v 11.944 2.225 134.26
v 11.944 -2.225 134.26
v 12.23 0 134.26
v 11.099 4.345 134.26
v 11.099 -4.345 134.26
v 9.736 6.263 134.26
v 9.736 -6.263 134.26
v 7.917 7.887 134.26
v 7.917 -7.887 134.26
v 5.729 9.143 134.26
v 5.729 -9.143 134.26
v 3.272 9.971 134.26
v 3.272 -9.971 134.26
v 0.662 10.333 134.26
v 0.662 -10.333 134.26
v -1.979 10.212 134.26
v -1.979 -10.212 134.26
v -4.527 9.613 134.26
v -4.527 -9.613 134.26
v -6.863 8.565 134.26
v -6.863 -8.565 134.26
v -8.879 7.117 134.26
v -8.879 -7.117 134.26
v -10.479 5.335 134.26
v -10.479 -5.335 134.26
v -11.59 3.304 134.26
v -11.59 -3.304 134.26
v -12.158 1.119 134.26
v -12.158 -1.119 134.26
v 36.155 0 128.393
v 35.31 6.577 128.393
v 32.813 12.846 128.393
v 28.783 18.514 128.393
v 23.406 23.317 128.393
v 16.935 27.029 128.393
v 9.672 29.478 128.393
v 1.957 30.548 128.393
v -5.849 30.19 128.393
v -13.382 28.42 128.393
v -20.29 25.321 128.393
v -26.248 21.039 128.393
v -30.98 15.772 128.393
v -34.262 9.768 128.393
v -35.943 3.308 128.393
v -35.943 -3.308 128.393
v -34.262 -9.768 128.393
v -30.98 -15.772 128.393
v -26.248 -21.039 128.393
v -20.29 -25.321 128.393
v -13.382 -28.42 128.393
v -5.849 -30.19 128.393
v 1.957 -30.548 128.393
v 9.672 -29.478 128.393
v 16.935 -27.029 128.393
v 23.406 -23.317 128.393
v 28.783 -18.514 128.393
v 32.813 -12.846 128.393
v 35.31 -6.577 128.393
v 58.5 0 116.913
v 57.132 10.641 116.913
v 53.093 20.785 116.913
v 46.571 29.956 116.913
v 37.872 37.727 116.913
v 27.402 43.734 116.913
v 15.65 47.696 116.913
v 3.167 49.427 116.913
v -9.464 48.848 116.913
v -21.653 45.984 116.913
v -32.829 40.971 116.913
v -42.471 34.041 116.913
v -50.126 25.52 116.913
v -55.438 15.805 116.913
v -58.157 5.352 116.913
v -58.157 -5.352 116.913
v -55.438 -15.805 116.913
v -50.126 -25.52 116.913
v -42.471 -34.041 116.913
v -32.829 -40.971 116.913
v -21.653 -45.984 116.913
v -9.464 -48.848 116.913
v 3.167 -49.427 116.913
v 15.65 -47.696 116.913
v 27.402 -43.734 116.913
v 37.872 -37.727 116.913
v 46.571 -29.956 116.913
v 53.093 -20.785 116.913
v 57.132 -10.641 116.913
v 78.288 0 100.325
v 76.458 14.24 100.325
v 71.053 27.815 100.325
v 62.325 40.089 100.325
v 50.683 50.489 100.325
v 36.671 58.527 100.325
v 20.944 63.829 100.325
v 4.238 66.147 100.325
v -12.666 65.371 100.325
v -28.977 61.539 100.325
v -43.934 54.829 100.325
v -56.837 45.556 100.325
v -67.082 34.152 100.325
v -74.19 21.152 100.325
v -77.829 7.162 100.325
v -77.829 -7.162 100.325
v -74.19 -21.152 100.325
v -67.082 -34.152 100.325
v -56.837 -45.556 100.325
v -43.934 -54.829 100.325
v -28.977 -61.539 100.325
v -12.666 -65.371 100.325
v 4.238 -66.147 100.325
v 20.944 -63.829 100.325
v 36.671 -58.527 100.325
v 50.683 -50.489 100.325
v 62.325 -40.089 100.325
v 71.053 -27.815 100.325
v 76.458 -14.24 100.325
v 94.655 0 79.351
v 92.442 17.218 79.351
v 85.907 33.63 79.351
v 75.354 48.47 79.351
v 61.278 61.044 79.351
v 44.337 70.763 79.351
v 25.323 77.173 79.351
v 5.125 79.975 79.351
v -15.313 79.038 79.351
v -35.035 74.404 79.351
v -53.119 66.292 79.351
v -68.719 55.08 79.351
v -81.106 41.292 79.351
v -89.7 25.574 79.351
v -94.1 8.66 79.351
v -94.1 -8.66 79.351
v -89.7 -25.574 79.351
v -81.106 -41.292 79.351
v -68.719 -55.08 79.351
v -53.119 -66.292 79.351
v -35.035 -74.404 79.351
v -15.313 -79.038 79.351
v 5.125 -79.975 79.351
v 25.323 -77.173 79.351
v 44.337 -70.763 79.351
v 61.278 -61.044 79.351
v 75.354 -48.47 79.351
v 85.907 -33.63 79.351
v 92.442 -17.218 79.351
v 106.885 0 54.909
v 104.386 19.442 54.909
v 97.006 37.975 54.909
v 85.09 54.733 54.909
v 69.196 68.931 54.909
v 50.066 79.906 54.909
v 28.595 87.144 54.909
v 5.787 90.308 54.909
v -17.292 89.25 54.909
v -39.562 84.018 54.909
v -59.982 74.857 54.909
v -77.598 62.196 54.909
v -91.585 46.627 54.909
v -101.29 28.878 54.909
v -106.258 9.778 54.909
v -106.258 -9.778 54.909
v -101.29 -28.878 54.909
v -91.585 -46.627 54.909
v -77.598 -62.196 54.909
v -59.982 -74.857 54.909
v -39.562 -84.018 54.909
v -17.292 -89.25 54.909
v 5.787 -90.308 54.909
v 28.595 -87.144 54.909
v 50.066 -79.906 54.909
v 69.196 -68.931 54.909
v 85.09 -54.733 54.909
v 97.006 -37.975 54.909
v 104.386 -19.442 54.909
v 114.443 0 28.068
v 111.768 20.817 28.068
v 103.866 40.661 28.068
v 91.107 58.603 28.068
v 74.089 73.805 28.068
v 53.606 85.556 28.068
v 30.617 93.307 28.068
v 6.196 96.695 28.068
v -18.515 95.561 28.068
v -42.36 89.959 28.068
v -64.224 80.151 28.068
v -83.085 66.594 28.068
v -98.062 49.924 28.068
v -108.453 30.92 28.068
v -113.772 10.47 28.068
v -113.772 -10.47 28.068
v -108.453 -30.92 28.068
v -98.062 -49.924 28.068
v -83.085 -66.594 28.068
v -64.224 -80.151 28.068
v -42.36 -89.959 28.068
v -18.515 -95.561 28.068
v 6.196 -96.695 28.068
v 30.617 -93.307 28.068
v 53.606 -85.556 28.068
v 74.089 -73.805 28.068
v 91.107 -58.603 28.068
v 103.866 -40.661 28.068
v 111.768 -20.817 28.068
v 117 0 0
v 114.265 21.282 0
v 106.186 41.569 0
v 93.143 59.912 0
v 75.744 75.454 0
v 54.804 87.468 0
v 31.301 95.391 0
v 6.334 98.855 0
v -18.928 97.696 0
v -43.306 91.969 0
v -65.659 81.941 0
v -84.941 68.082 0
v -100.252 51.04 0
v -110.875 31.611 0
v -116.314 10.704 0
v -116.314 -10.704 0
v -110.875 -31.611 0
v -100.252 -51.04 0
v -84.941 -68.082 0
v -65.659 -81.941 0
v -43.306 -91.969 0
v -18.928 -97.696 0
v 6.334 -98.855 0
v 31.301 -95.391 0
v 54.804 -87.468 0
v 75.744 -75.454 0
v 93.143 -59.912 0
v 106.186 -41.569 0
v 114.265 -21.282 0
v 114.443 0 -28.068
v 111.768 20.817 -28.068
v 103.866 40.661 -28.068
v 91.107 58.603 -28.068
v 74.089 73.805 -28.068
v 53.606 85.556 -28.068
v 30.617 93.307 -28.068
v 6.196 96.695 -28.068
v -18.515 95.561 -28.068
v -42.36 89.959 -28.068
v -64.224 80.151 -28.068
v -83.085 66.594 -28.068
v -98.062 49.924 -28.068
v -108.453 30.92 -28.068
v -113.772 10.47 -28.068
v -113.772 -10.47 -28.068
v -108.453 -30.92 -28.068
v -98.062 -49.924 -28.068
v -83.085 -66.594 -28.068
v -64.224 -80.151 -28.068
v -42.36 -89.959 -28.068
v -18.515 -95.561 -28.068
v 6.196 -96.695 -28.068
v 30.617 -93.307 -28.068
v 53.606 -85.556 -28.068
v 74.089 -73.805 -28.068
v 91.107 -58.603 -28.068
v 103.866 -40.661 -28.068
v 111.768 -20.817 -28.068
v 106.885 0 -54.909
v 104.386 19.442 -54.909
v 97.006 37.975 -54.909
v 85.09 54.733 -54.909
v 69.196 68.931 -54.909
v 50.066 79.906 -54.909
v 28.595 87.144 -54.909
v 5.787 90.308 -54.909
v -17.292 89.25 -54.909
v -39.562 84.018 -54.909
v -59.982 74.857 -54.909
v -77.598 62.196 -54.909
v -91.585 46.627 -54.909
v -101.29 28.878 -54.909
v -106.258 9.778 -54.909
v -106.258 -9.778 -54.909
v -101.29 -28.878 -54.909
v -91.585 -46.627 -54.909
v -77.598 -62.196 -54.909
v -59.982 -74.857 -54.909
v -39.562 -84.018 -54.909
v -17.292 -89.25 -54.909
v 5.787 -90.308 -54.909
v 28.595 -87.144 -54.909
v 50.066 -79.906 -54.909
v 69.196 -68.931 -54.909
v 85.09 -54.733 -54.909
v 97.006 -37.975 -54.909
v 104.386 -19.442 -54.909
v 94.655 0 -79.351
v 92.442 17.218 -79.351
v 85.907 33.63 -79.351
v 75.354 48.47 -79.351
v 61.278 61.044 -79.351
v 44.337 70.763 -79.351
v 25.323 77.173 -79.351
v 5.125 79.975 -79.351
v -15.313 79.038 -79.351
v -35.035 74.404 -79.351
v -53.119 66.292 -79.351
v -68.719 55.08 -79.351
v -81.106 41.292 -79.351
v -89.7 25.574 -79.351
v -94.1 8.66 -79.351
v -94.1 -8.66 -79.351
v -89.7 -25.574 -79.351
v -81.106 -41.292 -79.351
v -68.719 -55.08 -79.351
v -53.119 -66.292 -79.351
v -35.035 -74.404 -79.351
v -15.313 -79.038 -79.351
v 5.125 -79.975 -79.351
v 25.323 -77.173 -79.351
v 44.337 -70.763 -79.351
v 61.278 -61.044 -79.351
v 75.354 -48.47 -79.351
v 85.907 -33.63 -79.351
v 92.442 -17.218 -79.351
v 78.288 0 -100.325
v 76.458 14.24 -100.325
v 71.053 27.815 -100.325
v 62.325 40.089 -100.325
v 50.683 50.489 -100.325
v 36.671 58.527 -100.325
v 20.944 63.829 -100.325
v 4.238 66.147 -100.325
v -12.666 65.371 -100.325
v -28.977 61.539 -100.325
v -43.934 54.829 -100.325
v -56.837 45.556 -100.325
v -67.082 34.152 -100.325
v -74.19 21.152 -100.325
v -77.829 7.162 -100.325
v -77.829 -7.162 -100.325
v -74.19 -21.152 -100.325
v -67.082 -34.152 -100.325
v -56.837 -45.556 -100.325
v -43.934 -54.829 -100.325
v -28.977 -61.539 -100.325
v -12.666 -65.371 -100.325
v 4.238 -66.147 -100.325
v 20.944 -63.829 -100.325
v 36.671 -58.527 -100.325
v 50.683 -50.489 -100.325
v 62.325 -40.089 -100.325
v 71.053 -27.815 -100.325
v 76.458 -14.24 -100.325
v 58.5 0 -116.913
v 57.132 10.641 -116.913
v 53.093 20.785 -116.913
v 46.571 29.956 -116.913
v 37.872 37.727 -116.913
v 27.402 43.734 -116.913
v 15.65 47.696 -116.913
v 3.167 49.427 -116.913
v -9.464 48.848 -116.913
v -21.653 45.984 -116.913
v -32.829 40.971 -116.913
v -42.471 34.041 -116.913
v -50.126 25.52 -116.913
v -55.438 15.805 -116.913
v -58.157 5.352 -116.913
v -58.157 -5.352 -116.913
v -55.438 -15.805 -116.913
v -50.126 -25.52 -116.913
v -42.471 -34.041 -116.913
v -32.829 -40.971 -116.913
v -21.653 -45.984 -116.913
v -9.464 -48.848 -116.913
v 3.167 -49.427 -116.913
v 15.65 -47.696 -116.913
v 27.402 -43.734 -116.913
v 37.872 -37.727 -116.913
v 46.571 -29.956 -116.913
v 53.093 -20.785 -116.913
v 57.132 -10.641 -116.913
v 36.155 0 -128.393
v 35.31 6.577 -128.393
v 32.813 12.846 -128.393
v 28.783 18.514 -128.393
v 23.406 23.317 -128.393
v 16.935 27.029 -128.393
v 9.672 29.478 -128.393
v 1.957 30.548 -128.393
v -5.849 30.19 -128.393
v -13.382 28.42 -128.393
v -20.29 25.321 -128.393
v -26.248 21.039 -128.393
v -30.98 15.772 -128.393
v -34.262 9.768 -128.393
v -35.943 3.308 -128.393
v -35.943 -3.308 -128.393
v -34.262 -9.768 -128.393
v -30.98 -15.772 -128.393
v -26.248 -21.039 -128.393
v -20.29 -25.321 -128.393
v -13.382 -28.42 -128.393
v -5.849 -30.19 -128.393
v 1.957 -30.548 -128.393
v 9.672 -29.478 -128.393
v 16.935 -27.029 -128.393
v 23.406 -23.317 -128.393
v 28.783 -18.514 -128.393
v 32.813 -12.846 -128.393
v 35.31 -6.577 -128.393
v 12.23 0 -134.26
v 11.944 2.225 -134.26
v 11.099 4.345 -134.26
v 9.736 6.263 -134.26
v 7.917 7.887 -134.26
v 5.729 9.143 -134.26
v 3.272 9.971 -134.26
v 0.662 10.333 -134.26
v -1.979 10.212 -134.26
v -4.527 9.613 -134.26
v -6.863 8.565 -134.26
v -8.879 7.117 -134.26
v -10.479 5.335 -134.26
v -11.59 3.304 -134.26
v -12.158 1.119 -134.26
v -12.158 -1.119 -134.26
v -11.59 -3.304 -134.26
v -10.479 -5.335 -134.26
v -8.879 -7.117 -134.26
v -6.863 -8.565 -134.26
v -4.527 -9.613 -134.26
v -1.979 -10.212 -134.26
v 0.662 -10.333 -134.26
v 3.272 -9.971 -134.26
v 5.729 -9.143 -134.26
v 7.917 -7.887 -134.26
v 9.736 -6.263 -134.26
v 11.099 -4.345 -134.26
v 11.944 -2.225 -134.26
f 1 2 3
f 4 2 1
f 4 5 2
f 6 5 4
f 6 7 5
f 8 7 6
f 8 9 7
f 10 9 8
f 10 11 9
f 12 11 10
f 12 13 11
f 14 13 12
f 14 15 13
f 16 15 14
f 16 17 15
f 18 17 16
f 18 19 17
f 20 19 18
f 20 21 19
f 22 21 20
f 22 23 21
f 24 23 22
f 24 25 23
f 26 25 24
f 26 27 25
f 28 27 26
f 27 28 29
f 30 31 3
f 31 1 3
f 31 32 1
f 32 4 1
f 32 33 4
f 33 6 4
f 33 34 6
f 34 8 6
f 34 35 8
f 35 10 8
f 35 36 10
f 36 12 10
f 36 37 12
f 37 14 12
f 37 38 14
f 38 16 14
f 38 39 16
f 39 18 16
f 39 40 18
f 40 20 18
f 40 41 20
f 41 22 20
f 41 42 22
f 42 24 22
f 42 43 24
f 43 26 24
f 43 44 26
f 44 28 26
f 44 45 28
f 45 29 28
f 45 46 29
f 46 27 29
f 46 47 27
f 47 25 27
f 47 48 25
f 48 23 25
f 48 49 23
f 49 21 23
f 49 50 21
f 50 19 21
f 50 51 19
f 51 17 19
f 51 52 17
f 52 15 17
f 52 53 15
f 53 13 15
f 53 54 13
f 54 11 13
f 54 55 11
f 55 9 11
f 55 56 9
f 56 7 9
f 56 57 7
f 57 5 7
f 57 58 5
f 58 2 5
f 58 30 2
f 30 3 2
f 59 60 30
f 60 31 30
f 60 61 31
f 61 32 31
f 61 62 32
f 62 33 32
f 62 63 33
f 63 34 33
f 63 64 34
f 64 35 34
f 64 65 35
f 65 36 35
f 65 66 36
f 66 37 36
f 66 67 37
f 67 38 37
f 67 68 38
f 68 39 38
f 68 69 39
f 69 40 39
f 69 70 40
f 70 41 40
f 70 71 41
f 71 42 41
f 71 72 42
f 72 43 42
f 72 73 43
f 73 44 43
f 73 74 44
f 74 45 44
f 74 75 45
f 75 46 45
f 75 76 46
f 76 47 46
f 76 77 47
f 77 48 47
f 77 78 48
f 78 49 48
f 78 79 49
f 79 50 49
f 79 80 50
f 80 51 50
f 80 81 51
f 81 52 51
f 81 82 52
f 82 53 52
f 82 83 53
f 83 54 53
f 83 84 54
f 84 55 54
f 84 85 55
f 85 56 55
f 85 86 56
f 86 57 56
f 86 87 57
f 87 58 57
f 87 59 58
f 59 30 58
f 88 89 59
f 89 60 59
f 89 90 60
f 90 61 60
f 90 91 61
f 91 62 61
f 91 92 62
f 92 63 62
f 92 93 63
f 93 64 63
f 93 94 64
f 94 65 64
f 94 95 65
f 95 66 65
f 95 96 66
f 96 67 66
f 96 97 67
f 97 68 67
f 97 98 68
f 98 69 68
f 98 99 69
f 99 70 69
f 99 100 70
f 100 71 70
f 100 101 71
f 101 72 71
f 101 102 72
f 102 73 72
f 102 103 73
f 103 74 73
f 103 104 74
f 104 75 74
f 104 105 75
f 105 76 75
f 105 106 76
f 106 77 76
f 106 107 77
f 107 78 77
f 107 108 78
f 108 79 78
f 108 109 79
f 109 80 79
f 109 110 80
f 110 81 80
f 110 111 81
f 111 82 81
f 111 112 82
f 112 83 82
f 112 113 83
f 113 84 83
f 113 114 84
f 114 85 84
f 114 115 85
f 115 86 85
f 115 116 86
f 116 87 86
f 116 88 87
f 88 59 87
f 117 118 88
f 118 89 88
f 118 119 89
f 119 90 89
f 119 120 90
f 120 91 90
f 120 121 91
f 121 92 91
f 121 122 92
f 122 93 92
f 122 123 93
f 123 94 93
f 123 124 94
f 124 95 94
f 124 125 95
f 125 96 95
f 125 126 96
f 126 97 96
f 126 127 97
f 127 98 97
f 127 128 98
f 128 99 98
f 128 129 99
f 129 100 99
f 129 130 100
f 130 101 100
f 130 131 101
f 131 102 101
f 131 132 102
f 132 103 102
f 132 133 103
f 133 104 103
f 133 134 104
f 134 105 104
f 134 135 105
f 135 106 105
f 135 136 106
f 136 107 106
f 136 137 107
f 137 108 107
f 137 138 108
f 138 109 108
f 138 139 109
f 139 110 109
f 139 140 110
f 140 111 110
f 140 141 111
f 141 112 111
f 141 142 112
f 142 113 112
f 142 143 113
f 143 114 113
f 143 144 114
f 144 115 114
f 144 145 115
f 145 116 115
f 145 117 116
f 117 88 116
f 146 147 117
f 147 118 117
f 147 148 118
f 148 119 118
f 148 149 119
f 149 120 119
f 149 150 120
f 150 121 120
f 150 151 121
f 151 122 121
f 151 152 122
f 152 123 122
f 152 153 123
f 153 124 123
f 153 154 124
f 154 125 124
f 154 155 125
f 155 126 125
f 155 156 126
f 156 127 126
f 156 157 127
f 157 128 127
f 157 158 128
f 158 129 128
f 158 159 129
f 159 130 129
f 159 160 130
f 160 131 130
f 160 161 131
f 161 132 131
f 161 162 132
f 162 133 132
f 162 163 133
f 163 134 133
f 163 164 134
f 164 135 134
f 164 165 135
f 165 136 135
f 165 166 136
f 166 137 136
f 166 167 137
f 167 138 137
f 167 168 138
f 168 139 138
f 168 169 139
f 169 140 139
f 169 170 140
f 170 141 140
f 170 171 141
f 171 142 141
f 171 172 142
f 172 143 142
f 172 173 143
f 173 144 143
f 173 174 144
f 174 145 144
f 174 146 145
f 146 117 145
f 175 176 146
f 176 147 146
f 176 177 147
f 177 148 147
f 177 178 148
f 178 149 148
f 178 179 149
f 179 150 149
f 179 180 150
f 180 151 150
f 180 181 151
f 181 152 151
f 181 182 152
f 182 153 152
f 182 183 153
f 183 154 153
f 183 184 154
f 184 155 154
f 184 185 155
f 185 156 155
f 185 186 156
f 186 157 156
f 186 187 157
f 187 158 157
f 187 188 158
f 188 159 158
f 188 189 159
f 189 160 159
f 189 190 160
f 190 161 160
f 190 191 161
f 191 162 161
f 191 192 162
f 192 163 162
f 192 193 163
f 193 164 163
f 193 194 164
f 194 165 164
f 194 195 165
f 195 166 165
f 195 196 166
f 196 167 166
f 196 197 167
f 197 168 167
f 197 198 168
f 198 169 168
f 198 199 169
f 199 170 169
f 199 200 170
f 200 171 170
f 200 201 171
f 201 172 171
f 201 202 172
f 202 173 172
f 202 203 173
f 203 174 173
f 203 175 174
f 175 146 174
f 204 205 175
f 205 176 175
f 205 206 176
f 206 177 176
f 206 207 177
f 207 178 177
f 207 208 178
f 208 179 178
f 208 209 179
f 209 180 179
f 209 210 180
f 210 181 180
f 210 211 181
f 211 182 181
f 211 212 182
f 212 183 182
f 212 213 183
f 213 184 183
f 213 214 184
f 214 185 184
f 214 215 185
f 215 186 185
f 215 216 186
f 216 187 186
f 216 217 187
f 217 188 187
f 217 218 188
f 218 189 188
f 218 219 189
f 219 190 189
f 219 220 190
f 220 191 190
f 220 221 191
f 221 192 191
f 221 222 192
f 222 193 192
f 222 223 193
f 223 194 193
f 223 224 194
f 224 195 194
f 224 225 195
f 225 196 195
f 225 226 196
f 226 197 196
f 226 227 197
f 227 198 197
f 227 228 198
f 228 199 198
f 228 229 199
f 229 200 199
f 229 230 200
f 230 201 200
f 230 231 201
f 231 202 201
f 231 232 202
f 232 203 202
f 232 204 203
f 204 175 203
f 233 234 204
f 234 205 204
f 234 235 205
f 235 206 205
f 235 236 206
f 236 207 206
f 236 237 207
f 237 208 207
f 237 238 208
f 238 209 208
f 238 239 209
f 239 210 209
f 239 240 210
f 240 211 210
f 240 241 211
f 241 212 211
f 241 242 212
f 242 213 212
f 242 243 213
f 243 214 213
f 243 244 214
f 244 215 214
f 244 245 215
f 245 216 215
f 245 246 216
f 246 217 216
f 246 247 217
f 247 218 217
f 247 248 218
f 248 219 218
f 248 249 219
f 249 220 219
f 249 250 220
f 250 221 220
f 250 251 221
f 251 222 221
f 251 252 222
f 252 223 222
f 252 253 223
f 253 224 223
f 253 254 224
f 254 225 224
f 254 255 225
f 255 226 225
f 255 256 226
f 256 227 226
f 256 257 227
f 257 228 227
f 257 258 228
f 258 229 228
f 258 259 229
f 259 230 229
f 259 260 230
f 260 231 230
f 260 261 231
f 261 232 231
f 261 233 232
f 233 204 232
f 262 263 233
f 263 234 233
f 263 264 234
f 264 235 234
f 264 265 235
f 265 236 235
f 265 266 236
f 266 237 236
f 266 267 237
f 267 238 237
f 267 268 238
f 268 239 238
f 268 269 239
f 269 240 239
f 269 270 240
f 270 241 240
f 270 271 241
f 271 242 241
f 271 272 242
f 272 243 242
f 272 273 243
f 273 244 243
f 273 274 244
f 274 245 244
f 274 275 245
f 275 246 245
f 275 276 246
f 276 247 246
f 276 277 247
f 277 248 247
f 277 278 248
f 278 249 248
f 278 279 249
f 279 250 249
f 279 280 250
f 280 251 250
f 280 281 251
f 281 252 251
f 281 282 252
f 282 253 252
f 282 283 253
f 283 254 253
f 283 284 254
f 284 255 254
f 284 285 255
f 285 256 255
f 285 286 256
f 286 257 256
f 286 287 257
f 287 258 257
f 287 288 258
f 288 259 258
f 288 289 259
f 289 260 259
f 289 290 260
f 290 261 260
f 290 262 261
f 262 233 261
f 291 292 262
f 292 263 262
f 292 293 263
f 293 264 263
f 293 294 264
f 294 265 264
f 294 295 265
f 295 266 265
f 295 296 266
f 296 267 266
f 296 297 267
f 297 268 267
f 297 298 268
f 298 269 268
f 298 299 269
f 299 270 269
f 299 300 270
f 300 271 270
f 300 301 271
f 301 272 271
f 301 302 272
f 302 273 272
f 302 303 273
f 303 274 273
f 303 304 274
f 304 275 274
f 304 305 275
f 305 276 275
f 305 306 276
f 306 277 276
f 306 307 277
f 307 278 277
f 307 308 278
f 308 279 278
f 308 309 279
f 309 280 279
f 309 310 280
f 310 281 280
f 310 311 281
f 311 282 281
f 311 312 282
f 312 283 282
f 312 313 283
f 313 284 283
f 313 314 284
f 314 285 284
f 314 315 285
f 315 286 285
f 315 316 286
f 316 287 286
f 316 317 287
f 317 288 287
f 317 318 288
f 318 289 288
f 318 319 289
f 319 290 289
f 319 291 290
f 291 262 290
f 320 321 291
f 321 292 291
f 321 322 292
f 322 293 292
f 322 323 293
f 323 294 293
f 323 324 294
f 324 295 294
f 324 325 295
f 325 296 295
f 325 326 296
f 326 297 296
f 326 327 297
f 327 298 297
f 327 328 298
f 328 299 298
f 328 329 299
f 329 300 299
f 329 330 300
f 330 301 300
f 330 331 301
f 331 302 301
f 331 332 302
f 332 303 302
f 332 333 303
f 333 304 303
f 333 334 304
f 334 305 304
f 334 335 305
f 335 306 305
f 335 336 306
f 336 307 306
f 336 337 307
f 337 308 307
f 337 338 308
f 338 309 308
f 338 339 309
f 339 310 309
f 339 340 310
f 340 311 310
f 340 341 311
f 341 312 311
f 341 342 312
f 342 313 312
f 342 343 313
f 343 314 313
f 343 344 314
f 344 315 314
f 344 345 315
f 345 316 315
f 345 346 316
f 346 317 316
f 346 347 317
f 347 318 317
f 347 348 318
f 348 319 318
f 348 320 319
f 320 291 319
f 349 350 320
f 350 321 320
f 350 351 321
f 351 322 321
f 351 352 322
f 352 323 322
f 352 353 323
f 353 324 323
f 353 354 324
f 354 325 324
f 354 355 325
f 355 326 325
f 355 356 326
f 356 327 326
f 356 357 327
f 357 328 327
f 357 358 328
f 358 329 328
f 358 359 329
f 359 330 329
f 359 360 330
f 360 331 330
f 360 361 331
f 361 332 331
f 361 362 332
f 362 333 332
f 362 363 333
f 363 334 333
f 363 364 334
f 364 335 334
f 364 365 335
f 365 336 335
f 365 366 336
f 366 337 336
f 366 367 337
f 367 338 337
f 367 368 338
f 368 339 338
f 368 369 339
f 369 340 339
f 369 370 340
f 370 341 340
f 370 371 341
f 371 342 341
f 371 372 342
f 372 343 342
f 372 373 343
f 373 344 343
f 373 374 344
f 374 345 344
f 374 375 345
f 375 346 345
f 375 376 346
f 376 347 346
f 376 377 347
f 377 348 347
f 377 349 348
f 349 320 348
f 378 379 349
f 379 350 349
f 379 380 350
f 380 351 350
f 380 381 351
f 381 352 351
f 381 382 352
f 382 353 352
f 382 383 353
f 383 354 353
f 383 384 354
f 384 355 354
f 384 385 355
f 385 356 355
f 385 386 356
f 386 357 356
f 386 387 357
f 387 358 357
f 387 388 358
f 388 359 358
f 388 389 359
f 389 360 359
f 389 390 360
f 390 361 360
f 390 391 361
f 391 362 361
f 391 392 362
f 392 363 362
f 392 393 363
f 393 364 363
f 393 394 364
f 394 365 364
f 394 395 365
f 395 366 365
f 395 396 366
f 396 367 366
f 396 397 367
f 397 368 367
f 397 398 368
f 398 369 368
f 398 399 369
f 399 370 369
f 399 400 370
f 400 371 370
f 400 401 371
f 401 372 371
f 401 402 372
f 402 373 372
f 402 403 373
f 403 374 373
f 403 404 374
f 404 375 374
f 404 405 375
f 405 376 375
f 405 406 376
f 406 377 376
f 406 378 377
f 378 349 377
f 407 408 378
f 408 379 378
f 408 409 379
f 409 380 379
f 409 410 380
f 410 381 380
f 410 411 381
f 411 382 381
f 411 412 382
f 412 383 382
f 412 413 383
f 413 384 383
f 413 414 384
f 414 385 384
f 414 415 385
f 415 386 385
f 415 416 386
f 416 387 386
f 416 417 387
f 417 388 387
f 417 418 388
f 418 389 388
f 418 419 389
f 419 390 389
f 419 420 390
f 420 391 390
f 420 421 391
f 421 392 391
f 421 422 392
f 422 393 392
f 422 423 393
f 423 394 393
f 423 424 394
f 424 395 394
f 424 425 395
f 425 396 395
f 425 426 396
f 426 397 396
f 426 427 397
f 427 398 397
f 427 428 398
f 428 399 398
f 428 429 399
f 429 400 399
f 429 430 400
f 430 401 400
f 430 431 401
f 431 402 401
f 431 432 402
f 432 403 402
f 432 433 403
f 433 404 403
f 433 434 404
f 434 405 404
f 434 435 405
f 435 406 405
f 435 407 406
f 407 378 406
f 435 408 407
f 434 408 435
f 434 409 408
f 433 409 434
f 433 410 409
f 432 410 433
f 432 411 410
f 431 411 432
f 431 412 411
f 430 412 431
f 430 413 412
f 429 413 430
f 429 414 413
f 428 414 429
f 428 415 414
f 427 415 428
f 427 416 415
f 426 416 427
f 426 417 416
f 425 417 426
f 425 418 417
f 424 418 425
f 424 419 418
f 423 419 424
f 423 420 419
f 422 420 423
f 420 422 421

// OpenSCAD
// Generated by SolidPython 1.0.1 on 2020-07-29 00:46:51


scale(v = [13, 11, 15]) {
	sphere(r = 9);
}
/***********************************************
*********      SolidPython code:      **********
************************************************
 
# import packages: SolidPython
from solid import *
from solid.utils import *
from itertools import chain, combinations, permutations


class Resize:

    def __init__(self, scad_file):
        self.scad_file = scad_file
        #self.scad_file = import_scad(scad_file)
        # cone/cylinder param:
        self.r1 = 0
        self.r2 = 0
        self.h = 0
        # rectangular prism param:
        self.w = 0
        self.l = 0
        # ellipse param:
        self.r = 0

    # import OpenScad code (file name corresponds to shape)


    # classify shape + parameters
    def assign(self, param1, param2, param3):
        if self.scad_file == 'cone.scad':
            self.r1 = param1
            self.r2 = param2
            self.h = param3
        elif self.scad_file == 'cylinder.scad':
            self.r1 = param1
            self.r2 = param2
            self.h = param3
        elif self.scad_file == 'rectangularPrism.scad':
            self.h = param1
            self.l = param2
            self.w = param3
        else:
            self.r = param1
            self.h = param2

    # resize parameters
    def iterate(self):
        x = range(3, 20, 2)
        i = 1
        if self.scad_file == 'cone.scad':
            tempList = list(permutations(x, 2))
            for temp in tempList:
                param1 = temp[0]
                param2 = temp[1]
                filepath = 'produced_scad_files/' + 'cone' + str(param1) + '_' + str(param2) + '_' + '.scad'
                scad_render_to_file(cylinder(h=param1, r1=param2, r2=0), filepath)

        elif self.scad_file == 'cylinder.scad':
            tempList = list(permutations(x, 3))
            for temp in tempList:
                param1 = temp[0]
                param2 = temp[1]
                filepath = 'produced_scad_files/' + 'cylinder' + str(param1) + '_' + str(param2) + '_' + '.scad'
                scad_render_to_file(cylinder(h=param1, r1=param2, r2=param2), filepath)

        elif self.scad_file == 'rectangularPrism.scad':
            tempList = list(permutations(x, 3))
            for temp in tempList:
                param1 = temp[0]
                param2 = temp[1]
                param3 = temp[2]
                filepath = 'produced_scad_files/' + 'rectangularPrism' + str(param1) + '_' + str(param2) + '_' + str(
                    param3) + '.scad'
                scad_render_to_file(cube(size=(param1, param2, param3)), filepath)

        elif self.scad_file == 'ellipse.scad':
            tempList = list(permutations(x, 4))
            for temp in tempList:
                param1 = temp[0]
                param2 = temp[1]
                param3 = temp[2]
                param4 = temp[3]
                filepath = 'produced_scad_files/' + 'ellipse' + str(param1) + '_' + str(param2) + '_' + str(param3) + '_' + str(param4) + '.scad'
                scad_render_to_file(scale([param1, param2, param3])(sphere(r=param4)), filepath)

    def render_to_scadfile(self):
        scad_render_to_file(scad, 'example.scad') 
 
************************************************/
